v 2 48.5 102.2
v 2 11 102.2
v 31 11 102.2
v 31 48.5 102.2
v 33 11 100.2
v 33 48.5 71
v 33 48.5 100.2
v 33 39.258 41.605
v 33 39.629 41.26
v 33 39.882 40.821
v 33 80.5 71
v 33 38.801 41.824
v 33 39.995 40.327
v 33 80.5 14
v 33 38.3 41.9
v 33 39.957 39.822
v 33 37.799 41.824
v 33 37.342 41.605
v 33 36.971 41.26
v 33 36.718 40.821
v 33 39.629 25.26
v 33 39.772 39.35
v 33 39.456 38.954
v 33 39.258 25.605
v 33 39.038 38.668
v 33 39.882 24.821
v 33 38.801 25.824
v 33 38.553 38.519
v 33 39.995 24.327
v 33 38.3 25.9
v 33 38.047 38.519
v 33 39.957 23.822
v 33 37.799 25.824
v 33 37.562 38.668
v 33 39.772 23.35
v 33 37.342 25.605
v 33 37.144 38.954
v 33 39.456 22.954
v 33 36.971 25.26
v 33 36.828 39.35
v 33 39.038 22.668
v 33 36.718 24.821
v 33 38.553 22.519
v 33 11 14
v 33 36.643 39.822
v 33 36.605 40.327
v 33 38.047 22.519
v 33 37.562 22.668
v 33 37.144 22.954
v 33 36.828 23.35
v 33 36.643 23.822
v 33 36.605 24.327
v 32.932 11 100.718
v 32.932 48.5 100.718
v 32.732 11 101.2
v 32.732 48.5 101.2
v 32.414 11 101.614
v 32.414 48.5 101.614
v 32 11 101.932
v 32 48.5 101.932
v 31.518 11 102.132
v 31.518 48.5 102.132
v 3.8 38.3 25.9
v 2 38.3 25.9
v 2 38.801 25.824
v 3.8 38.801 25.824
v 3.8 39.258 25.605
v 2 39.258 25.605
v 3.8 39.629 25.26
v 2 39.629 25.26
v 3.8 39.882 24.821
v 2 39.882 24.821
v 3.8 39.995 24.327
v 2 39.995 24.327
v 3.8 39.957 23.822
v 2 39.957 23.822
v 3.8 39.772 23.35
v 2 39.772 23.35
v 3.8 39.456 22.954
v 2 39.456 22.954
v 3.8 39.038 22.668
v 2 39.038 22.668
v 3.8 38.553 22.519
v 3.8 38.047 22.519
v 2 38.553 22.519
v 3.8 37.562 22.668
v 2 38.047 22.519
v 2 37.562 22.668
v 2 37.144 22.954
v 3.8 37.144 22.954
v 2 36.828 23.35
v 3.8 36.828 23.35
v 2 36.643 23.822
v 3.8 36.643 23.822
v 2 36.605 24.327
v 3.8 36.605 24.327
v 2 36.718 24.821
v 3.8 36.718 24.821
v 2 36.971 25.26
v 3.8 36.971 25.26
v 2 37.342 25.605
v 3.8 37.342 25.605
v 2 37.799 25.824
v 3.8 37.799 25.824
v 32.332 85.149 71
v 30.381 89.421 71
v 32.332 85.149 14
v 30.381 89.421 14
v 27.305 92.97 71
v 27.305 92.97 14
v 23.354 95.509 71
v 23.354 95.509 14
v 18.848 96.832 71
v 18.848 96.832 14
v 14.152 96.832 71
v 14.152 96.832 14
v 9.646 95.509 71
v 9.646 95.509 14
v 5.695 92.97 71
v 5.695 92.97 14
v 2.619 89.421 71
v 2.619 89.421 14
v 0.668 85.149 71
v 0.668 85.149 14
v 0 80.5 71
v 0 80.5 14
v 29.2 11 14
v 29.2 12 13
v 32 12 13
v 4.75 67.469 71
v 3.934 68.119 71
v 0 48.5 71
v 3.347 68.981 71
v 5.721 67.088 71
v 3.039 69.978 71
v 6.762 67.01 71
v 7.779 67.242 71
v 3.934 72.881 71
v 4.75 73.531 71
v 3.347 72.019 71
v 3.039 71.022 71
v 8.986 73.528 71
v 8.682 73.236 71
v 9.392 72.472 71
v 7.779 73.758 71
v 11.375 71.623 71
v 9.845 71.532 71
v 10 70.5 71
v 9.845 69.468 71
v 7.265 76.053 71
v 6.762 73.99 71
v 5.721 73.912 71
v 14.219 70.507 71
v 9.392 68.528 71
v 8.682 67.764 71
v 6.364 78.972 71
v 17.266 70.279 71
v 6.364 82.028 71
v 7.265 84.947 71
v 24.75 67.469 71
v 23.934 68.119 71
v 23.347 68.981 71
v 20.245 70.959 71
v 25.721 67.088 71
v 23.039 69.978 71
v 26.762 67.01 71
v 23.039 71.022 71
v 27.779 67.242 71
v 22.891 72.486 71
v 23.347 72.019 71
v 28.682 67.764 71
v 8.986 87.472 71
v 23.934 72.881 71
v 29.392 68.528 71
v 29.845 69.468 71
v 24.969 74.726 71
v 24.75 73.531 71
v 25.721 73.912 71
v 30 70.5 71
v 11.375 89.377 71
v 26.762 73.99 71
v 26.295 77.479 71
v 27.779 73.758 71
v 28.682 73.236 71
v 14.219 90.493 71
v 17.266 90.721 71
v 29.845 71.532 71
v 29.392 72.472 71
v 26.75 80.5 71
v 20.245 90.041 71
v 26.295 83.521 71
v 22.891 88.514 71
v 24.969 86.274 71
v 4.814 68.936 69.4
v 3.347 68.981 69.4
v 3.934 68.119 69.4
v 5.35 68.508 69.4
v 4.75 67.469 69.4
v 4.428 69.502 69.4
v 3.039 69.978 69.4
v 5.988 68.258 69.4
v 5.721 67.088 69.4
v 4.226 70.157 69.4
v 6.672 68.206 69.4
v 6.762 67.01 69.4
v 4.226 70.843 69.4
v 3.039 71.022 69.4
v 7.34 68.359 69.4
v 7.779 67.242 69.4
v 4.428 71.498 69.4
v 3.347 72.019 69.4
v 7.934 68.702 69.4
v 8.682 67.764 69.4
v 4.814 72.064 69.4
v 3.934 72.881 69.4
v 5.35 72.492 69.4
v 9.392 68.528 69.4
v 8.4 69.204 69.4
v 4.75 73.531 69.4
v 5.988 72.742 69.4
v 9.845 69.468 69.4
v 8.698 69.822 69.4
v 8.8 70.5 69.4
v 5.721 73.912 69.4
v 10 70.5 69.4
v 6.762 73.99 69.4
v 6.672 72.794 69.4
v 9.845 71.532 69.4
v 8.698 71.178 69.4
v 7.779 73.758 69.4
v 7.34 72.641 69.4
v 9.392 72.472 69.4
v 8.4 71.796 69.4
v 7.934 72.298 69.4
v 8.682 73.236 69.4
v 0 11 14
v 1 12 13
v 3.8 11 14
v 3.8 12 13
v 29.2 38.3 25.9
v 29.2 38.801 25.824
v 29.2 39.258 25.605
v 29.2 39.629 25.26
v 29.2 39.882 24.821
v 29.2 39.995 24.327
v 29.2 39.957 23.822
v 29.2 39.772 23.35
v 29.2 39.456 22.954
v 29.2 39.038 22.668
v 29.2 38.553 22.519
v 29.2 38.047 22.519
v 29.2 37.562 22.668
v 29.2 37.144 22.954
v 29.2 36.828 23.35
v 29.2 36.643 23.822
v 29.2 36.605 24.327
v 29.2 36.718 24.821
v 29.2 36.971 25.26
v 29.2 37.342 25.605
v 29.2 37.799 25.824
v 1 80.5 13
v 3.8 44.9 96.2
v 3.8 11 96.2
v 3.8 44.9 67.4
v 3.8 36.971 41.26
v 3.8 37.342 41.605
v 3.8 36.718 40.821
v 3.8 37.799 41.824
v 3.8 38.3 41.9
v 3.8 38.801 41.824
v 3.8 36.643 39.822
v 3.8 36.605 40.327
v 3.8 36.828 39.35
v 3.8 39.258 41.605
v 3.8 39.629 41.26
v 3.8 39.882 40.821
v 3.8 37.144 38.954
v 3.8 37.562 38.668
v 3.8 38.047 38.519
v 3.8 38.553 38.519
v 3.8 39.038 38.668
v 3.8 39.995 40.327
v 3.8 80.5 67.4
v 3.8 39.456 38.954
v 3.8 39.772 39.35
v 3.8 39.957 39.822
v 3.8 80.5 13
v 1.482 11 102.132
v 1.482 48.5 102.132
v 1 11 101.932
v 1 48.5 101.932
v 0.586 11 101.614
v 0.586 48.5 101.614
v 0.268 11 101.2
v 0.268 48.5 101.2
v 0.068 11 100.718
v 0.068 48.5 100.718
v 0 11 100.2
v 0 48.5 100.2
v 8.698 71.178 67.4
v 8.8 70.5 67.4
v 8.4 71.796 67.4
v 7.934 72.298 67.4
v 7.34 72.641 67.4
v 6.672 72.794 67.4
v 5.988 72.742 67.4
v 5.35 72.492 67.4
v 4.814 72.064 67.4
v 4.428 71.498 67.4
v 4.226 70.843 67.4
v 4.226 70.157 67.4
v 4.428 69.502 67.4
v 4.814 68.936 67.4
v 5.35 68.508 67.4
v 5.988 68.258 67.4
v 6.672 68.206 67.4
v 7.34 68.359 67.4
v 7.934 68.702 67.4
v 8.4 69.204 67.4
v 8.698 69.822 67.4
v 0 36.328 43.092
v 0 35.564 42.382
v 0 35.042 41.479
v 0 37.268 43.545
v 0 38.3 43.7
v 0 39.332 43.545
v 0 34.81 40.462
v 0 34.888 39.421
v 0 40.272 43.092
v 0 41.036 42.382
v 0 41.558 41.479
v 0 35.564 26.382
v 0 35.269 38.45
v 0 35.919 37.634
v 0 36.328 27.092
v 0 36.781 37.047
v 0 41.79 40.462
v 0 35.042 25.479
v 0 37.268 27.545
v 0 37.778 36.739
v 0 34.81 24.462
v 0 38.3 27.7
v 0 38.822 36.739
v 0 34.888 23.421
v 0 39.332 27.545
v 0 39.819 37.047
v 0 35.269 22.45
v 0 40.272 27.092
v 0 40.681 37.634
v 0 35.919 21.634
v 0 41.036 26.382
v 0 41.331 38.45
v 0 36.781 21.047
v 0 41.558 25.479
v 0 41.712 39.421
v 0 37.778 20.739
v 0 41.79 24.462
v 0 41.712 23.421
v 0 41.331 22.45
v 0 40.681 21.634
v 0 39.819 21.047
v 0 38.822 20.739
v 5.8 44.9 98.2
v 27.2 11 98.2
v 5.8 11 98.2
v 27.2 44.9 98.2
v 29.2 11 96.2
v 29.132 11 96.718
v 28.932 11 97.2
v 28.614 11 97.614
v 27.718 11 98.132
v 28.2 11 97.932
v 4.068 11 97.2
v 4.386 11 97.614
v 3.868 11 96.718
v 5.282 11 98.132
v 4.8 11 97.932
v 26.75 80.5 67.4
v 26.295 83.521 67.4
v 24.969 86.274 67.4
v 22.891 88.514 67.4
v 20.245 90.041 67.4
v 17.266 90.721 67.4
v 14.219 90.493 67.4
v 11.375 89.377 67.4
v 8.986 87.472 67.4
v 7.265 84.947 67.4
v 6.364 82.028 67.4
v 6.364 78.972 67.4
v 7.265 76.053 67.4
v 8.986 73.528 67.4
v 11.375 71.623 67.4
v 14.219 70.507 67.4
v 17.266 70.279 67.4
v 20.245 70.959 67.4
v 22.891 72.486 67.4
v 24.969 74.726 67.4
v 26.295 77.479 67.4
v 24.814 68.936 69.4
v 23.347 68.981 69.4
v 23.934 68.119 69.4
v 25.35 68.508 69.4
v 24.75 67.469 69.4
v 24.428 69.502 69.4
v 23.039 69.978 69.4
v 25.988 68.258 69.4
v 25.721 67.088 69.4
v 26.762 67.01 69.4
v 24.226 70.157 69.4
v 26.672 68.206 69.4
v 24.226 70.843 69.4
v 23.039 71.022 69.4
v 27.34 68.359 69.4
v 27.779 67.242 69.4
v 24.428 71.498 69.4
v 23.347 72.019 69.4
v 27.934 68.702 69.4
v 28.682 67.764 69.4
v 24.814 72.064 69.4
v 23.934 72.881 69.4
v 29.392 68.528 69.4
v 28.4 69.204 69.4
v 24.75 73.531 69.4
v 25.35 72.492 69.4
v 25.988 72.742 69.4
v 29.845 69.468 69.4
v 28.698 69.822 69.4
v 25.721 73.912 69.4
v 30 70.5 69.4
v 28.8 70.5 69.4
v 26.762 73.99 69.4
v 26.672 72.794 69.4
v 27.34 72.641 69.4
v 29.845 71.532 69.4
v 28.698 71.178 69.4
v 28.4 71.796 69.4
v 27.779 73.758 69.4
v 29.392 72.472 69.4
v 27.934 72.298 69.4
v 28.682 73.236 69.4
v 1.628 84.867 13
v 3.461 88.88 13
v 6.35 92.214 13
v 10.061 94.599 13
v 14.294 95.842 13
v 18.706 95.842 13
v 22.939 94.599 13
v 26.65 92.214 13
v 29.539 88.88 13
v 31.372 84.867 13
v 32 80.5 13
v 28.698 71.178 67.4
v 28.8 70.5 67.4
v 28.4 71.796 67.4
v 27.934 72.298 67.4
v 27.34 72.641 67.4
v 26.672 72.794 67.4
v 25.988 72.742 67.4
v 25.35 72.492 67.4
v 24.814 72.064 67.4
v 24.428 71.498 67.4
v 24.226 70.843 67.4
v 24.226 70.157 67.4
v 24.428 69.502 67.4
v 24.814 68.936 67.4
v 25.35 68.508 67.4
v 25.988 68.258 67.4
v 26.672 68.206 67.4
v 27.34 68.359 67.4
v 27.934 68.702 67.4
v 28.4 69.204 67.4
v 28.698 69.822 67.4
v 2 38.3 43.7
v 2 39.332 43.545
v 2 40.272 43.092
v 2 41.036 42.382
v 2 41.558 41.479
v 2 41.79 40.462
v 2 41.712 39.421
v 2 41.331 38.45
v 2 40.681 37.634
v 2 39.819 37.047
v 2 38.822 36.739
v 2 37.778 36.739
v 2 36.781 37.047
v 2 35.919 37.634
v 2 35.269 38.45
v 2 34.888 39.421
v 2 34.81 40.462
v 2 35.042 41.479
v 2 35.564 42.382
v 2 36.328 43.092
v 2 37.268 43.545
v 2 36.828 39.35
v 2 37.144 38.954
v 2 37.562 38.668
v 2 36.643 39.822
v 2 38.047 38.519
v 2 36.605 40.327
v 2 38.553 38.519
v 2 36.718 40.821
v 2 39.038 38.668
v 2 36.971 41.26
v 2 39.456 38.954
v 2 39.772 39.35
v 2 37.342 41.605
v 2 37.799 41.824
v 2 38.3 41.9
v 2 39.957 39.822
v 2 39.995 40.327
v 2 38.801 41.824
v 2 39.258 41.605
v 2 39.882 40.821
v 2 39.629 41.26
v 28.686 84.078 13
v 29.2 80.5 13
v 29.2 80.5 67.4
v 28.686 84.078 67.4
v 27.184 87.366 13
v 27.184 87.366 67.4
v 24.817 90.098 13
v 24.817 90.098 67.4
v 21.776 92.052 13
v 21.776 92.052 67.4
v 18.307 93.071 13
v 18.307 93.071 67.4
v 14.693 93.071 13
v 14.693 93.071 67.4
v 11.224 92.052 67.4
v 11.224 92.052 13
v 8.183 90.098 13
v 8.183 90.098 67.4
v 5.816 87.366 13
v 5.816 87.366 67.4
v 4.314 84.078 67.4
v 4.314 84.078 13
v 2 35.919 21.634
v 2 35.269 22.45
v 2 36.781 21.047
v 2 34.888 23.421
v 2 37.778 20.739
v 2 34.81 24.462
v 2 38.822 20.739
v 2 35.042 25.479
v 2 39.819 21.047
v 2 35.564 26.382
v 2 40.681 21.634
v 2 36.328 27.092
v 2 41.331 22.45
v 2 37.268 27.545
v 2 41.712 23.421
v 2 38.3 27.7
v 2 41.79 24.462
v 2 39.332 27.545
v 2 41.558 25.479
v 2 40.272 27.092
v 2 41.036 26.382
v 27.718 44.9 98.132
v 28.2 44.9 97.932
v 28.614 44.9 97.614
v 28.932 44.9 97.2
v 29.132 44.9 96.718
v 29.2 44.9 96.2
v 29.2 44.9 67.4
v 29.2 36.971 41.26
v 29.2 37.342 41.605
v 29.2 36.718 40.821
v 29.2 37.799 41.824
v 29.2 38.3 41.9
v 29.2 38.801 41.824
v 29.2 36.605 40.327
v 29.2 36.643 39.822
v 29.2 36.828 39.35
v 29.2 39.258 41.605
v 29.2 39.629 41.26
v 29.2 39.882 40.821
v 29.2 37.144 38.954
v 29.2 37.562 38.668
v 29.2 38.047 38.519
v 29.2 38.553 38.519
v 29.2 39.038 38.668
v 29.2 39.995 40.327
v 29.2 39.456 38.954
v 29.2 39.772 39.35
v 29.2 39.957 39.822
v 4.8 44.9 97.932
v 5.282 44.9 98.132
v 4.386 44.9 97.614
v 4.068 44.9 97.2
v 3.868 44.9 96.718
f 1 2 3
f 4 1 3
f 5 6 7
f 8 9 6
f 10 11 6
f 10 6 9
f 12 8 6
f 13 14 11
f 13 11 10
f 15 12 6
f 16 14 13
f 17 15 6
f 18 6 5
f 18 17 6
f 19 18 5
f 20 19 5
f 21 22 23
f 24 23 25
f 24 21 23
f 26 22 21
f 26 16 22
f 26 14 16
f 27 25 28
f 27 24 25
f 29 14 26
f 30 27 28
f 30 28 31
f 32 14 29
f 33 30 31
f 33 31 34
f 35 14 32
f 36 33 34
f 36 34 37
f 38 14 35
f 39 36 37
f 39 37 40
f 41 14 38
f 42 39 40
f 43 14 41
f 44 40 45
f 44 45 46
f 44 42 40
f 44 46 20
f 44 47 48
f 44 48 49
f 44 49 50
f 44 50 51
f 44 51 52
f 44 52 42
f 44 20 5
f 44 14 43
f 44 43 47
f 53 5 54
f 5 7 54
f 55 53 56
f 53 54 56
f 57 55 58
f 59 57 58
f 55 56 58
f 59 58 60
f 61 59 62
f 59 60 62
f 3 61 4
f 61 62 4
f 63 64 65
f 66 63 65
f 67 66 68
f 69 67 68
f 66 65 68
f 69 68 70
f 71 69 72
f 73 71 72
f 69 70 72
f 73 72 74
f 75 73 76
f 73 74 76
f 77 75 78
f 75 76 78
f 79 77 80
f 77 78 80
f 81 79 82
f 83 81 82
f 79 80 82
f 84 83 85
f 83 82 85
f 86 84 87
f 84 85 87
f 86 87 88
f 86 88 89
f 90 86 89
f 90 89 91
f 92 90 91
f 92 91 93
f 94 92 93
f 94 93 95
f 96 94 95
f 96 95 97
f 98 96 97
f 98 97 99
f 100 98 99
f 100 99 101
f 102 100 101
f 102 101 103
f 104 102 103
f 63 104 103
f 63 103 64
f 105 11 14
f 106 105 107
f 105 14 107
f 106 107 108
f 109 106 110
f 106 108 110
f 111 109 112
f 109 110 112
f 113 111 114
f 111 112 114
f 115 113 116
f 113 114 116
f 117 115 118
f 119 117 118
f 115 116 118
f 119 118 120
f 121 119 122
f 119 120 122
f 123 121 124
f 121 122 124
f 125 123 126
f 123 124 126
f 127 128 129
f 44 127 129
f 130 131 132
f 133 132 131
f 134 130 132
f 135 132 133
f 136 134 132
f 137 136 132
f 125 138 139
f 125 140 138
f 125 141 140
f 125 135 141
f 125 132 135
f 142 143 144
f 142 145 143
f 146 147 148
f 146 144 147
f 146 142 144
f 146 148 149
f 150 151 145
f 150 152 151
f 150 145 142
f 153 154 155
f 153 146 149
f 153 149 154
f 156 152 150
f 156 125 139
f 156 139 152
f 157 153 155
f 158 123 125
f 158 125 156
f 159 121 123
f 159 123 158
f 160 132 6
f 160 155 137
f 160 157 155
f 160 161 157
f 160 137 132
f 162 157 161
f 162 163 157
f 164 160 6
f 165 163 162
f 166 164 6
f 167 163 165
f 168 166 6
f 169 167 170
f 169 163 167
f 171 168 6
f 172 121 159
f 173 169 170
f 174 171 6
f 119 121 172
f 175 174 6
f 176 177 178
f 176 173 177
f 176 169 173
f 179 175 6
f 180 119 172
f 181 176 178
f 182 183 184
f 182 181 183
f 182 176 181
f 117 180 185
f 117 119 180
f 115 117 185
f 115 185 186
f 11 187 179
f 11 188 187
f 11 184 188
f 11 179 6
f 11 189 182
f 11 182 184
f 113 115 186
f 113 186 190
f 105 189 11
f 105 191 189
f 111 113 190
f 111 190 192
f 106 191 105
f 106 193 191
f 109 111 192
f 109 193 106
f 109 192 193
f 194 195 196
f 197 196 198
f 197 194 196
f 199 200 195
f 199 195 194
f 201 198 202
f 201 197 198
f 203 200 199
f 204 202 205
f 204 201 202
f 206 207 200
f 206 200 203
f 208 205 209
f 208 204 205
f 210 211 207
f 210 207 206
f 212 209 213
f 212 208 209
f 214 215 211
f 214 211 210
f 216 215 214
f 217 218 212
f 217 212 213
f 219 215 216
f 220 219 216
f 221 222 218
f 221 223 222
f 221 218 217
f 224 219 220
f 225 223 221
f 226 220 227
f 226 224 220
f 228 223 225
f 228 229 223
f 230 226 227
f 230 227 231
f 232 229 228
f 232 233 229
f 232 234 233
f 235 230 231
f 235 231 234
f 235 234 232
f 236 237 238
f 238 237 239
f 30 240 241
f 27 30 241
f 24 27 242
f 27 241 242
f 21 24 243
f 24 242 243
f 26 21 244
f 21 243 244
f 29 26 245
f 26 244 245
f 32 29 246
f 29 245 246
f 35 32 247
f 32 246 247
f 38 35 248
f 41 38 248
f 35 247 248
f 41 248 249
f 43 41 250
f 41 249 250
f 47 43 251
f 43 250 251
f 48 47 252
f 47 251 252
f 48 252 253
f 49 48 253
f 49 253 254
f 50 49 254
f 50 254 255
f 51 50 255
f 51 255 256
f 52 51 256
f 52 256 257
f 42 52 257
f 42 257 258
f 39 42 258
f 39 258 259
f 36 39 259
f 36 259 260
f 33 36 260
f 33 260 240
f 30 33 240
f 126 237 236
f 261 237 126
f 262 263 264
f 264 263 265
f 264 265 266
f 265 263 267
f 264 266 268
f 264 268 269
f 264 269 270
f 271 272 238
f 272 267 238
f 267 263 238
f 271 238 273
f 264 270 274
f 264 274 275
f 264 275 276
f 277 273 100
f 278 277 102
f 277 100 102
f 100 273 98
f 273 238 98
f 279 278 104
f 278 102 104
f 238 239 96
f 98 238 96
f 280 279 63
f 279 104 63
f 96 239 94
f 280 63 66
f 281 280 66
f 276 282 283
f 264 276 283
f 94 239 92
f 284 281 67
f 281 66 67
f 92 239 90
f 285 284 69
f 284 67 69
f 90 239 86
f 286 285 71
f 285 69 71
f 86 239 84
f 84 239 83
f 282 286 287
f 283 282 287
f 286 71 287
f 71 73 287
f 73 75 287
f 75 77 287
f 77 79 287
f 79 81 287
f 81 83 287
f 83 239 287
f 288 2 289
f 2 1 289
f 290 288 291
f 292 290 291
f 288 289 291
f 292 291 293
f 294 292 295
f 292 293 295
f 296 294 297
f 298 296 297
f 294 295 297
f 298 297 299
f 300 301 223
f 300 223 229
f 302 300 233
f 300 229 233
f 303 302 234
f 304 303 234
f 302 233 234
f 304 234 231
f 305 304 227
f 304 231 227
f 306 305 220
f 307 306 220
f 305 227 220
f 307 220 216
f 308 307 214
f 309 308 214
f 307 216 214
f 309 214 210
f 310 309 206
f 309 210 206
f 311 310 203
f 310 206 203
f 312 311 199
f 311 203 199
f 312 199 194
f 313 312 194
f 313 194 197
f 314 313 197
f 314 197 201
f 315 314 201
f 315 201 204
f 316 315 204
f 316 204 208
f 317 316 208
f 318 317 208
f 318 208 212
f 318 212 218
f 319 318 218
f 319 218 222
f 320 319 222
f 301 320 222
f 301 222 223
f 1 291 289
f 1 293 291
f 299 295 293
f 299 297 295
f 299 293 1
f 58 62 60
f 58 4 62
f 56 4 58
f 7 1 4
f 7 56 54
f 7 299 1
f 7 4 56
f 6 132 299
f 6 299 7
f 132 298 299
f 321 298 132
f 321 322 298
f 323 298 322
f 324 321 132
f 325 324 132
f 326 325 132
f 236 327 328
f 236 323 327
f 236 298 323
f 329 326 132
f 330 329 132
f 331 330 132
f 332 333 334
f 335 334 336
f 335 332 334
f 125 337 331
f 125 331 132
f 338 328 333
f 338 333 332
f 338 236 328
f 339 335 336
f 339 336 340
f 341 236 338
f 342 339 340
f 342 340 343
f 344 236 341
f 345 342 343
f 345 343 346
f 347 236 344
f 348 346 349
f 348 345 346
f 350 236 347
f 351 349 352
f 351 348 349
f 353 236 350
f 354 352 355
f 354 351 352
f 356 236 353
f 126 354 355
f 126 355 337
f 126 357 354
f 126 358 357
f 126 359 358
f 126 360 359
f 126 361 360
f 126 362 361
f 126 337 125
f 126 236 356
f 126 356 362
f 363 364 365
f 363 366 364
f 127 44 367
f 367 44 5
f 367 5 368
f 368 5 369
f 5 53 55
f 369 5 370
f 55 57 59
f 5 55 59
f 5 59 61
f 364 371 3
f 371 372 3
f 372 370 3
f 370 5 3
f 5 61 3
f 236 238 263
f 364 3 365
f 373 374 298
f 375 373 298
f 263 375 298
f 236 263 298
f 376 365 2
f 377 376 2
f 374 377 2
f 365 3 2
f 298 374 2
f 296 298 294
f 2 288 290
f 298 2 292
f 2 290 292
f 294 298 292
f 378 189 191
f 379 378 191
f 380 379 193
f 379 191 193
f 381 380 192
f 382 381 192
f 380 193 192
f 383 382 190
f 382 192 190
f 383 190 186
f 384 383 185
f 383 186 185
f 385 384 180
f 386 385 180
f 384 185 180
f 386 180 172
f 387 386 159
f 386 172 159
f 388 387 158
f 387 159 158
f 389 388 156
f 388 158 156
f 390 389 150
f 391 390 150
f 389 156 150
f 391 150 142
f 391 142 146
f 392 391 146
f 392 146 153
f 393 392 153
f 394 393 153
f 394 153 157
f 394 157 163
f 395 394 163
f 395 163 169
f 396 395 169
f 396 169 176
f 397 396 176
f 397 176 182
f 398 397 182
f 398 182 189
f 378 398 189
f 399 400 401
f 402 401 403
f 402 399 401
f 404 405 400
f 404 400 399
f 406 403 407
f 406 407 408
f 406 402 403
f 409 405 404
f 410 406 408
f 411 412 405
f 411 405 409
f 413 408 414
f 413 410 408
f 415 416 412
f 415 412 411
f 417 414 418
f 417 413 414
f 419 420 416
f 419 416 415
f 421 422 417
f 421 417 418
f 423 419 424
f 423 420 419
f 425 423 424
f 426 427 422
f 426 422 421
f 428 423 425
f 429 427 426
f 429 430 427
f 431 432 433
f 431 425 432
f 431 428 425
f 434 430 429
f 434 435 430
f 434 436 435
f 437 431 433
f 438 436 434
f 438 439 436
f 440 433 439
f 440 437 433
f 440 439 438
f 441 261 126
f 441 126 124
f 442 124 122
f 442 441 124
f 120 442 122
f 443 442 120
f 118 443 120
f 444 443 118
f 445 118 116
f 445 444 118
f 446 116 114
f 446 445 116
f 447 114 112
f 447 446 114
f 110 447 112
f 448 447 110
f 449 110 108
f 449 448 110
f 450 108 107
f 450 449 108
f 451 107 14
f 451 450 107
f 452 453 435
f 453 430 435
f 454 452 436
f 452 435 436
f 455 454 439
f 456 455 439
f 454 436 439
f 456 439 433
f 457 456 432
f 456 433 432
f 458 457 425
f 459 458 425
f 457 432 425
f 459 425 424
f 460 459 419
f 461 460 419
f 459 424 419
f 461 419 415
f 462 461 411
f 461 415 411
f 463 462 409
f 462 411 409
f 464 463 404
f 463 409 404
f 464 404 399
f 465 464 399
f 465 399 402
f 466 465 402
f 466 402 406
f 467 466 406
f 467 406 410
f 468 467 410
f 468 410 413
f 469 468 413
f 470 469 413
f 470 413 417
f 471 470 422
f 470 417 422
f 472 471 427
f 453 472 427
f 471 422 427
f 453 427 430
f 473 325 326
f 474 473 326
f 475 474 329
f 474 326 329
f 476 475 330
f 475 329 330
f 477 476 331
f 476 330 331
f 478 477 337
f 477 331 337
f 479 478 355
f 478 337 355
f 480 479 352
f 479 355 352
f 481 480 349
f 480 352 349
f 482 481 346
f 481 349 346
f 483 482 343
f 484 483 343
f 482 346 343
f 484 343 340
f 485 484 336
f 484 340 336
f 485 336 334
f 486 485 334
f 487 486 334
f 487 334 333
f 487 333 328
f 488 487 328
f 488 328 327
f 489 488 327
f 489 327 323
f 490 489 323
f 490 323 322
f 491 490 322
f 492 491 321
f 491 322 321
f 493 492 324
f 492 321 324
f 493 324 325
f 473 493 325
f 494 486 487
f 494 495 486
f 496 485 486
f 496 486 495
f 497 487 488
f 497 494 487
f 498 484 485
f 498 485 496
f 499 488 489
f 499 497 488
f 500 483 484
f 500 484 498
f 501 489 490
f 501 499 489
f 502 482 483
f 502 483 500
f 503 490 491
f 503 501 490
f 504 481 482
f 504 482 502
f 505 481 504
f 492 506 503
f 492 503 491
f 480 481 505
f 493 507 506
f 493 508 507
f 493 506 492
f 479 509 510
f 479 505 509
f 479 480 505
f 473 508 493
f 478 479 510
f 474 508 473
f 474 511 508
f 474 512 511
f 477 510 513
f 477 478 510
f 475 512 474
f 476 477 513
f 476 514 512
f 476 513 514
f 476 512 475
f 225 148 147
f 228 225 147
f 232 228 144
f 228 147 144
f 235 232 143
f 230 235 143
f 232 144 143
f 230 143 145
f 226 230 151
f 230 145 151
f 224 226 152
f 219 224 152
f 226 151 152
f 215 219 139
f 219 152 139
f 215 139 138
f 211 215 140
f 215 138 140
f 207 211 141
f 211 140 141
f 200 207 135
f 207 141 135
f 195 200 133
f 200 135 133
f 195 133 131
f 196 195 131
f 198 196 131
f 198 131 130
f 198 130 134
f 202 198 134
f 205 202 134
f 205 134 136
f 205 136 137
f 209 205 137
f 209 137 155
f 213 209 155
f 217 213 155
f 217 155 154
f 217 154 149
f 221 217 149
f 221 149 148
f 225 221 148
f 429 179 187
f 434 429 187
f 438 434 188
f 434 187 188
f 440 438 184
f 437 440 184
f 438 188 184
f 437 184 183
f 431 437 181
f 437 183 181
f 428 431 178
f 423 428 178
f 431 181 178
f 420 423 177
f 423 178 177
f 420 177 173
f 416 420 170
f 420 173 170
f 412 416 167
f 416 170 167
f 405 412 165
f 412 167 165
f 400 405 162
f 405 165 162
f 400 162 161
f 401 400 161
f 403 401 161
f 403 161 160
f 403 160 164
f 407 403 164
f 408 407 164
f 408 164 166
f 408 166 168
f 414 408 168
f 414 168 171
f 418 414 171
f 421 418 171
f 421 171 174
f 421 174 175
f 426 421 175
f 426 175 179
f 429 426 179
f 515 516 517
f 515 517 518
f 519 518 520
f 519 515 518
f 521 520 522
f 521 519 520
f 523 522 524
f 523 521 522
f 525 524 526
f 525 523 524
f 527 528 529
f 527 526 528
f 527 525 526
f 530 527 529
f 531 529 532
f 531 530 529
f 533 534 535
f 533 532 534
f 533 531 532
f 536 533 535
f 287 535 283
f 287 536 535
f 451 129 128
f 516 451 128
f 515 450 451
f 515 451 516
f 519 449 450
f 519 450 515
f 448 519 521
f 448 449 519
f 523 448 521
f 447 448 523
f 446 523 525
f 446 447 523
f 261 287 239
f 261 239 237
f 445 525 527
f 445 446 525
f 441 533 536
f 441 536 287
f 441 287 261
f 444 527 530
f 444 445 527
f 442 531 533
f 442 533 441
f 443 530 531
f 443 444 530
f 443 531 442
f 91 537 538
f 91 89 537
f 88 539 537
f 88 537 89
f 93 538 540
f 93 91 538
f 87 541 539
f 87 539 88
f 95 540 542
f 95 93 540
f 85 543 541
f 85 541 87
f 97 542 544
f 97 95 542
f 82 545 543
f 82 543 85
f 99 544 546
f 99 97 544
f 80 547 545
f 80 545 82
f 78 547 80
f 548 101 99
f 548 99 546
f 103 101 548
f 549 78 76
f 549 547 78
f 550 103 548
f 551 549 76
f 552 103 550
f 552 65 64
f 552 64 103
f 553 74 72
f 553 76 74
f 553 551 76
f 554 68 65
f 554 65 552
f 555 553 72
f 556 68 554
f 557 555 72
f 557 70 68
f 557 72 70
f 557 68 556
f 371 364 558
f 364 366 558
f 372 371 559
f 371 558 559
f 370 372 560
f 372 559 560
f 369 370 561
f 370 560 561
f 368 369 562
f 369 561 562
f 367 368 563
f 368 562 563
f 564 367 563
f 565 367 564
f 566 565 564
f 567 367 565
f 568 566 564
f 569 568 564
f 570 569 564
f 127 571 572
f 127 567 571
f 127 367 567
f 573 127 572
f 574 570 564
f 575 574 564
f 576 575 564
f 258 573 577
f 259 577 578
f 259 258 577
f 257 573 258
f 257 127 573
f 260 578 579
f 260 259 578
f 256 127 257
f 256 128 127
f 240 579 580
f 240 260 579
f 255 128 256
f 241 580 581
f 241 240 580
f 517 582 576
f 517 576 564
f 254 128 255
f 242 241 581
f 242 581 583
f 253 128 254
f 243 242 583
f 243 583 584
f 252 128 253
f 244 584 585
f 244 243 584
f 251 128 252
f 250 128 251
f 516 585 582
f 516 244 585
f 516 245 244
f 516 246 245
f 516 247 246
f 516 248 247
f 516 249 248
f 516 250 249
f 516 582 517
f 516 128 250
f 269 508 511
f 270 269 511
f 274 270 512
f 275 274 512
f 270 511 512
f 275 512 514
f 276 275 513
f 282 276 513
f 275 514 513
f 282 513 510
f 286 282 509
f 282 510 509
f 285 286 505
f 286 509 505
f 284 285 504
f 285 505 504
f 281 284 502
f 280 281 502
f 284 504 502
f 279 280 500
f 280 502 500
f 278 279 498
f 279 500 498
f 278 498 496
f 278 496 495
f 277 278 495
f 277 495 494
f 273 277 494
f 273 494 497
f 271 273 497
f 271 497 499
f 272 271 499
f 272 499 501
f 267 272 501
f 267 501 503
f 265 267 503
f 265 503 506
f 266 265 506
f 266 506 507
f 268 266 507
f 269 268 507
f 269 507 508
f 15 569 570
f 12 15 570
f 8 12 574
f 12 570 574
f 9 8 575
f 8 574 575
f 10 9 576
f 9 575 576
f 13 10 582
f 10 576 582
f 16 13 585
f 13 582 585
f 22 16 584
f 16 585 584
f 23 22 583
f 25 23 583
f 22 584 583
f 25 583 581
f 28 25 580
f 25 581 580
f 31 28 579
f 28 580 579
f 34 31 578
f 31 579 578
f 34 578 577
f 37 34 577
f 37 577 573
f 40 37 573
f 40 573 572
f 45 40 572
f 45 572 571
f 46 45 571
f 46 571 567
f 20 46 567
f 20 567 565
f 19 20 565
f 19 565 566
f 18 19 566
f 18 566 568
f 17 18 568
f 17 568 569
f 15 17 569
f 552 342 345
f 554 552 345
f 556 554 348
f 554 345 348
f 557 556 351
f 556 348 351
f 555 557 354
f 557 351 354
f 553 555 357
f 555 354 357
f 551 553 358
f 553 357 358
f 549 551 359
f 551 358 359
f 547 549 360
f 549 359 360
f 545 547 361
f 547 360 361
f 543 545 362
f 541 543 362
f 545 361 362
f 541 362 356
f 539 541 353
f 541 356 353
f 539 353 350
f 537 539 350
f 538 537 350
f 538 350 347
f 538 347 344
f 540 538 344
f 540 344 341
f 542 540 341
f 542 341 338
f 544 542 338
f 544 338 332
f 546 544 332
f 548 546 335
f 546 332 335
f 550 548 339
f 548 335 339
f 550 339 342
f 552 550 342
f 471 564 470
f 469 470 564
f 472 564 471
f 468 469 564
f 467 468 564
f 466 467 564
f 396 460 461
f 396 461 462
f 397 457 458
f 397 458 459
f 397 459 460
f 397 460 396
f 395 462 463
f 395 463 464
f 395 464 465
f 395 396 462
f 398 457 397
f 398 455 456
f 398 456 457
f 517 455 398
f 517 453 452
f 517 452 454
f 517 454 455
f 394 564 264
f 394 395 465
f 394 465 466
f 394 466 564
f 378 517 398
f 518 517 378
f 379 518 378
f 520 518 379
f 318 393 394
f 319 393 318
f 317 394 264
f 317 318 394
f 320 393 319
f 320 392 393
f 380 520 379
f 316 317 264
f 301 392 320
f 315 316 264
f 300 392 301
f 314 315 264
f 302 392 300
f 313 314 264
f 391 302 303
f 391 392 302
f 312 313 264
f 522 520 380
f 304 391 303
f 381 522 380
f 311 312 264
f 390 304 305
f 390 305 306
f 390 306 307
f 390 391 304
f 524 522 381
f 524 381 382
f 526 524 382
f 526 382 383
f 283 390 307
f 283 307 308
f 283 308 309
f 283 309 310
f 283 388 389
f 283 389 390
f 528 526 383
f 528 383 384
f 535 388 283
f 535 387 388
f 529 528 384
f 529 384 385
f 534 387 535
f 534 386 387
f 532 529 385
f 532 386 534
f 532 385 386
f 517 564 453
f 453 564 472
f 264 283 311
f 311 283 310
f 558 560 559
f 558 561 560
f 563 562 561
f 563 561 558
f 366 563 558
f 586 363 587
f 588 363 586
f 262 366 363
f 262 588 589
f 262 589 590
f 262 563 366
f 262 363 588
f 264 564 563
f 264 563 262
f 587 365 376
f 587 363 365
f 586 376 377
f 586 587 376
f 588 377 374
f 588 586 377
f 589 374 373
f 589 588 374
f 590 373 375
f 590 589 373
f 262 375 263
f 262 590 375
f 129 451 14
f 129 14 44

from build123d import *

# Parameters (mm, degrees)
SKETCH1_W                                      = 4
SKETCH1_H                                      = 80.5
BOSS_EXTRUDE1_DEPTH                            = 71
BOSS_EXTRUDE2_START                            = -4
BOSS_EXTRUDE2_DEPTH                            = 4
BOSS_EXTRUDE3_DEPTH                            = 34.2
CUT_EXTRUDE1_DEPTH                             = 13
CUT_EXTRUDE2_DEPTH                             = 13
SKETCH6_R                                      = 1.7
CUT_EXTRUDE3_DEPTH                             = 13
SKETCH7_R                                      = 3.25
CUT_EXTRUDE4_DEPTH                             = 2.5
BOSS_EXTRUDE4_DEPTH                            = 44.5
SKETCH10_W                                     = 46.002383675
SKETCH10_H                                     = 61.711229379
CUT_EXTRUDE5_DEPTH                             = 42
BOSS_EXTRUDE5_DEPTH                            = 4
CUT_EXTRUDE6_DEPTH                             = 10.6
CUT_EXTRUDE7_REACH                             = 148.85
SKETCH13_R                                     = 1.7
SKETCH14_W                                     = 25
SKETCH14_H                                     = 33.9
BOSS_EXTRUDE6_DEPTH                            = 1
CUT_EXTRUDE8_DEPTH                             = 15
SKETCH16_W                                     = 10.4
SKETCH16_H                                     = 1.3
CUT_EXTRUDE9_DEPTH                             = 15
POPUNIO_RUPU_DEPTH                             = 15
SKETCH18_W                                     = 33
SKETCH18_H                                     = 37.9
SASEKAO_ZA_TRI_MM_DEPTH                        = 3
SKETCH19_R                                     = 3.5
SKETCH19_R_2                                   = 3.25
POVE_AO_RUPE_ZA_ZAVRTNJE_DEPTH                 = 2.5
SKRATIO_DNO_DEPTH                              = 0.4
SKETCH21_W                                     = 25
SKETCH21_H                                     = 33.2
NAPRAVIO_MALO_VI_E_MESTA_ZA_VRH_RAZVODNI_DEPTH = 0.4
SKRATIO_CEONI_DEO_DEPTH                        = 0.4
NAPRAVIO_MESTA_ZA_DRZAC_1_REACH                = 137.848
SKETCH24_W                                     = 0.2
SKETCH24_H                                     = 33.9
NAPRAVIO_EMSTA_ZA_DRZAC_2_DEPTH                = 32.8
CHAMFER1_SIZE                                  = 1
SKETCH26_R                                     = 2.3
POVECAO_OTVOR_ZA_M3_DEPTH                      = 1.1
SKETCH27_R                                     = 10.25
POVECAO_OTVOR_ZA_PRIKLJUCAK_DEPTH              = 10
SKETCH28_W                                     = 25.4
SKETCH28_H                                     = 33.9
BOSS_EXTRUDE7_DEPTH                            = 2
ZAOBLJENJE_ZA_PRST_R                           = 2
OBORENA_IVICA_ZA_AKU_SIZE                      = 1
BOSS_EXTRUDE8_START                            = 0.9
SKETCH29_R                                     = 3.5
SKETCH29_R_2                                   = 2.3
BOSS_EXTRUDE8_DEPTH                            = 0.9
SKETCH30_R                                     = 3.5
CUT_EXTRUDE10_DEPTH                            = 2


with BuildPart() as part:
    # Sketch1 → Boss-Extrude1 (new body)
    with BuildSketch(Plane.XY):
        with Locations((2, 40.25)):
            Rectangle(SKETCH1_W, SKETCH1_H)
        with BuildLine():
            Line((0, 80.5), (4, 80.5))
            ThreePointArc((4, 80.5), (16.5, 93), (29, 80.5))
            Line((29, 80.5), (33, 80.5))
            ThreePointArc((33, 80.5), (16.5, 97), (0, 80.5))
        make_face()
        with Locations((31, 40.25)):
            Rectangle(SKETCH1_W, SKETCH1_H)
    extrude(amount=BOSS_EXTRUDE1_DEPTH)

    # Sketch2 → Boss-Extrude2 (add)
    with BuildSketch(Plane.XY.offset(71).offset(BOSS_EXTRUDE2_START)):
        with BuildLine():
            Line((33, 48.5), (0, 48.5))
            Line((0, 48.5), (0, 80.5))
            ThreePointArc((0, 80.5), (16.5, 97), (33, 80.5))
            Line((33, 80.5), (33, 48.5))
        make_face()
    extrude(amount=BOSS_EXTRUDE2_DEPTH)

    # Sketch3 → Boss-Extrude3 (add)
    with BuildSketch(Plane(origin=(0, 0, 67), x_dir=(-1, 0, 0), z_dir=(0, 0, -1))):
        Polygon((-33, 0), (-33, 48.5), (-29, 48.5), (-4, 48.5), (0, 48.5), (0, 0), (-3.837905566, 0), (-4, 44.5), (-29, 44.5), (-29.162094434, 0), align=None)
    extrude(amount=-BOSS_EXTRUDE3_DEPTH)

    # Sketch4 → Cut-Extrude1 (cut)
    with BuildSketch(Plane(origin=(0, 0, 0), x_dir=(-1, 0, 0), z_dir=(0, 0, -1))):
        with BuildLine():
            Line((-4, 80.5), (-4, 0))
            Line((-4, 0), (0, 0))
            Line((0, 0), (0, 80.5))
            ThreePointArc((0, 80.5), (-16.5, 97), (-33, 80.5))
            Line((-33, 80.5), (-33, 0))
            Line((-33, 0), (-29, 0))
            Line((-29, 0), (-29, 80.5))
            ThreePointArc((-29, 80.5), (-16.5, 93), (-4, 80.5))
        make_face()
    extrude(amount=-CUT_EXTRUDE1_DEPTH, mode=Mode.SUBTRACT)

    # Sketch5 → Cut-Extrude2 (cut)
    with BuildSketch(Plane.XY.offset(71)):
        with BuildLine():
            ThreePointArc((26.5, 80.5), (16.5, 90.5), (6.5, 80.5))
            Line((6.5, 80.5), (26.5, 80.5))
        make_face()
        with BuildLine():
            Line((26.5, 80.5), (6.5, 80.5))
            ThreePointArc((6.5, 80.5), (16.5, 70.5), (26.5, 80.5))
        make_face()
    extrude(amount=-CUT_EXTRUDE2_DEPTH, mode=Mode.SUBTRACT)

    # Sketch6 → Cut-Extrude3 (cut)
    with BuildSketch(Plane.XY.offset(71)):
        with Locations((6.5, 70.5)):
            Circle(SKETCH6_R)
        with BuildLine():
            ThreePointArc((28.2, 70.5), (26.5, 72.2), (24.8, 70.5))
            Line((24.8, 70.5), (28.2, 70.5))
        make_face()
        with BuildLine():
            Line((28.2, 70.5), (24.8, 70.5))
            ThreePointArc((24.8, 70.5), (26.5, 68.8), (28.2, 70.5))
        make_face()
    extrude(amount=-CUT_EXTRUDE3_DEPTH, mode=Mode.SUBTRACT)

    # Sketch7 → Cut-Extrude4 (cut)
    with BuildSketch(Plane.XY.offset(71)):
        with Locations((6.5, 70.5)):
            Circle(SKETCH7_R)
        with Locations((26.5, 70.5)):
            Circle(SKETCH7_R)
    extrude(amount=-CUT_EXTRUDE4_DEPTH, mode=Mode.SUBTRACT)

    # Sketch9 → Boss-Extrude4 (add)
    with BuildSketch(Plane.XZ):
        Polygon((29.162094434, 101.2), (29.162094434, 71), (29, 71), (29, 120), align=None)
        Polygon((4, 120), (3.837905566, 101.2), (3.837905566, 71), (4, 71), align=None)
    extrude(amount=-BOSS_EXTRUDE4_DEPTH)

    # Sketch10 → Cut-Extrude5 (cut)
    with BuildSketch(Plane.XY.offset(101.2)):
        with Locations((17.24268837, 24.291112106)):
            Rectangle(SKETCH10_W, SKETCH10_H)
    extrude(amount=CUT_EXTRUDE5_DEPTH, mode=Mode.SUBTRACT)

    # Sketch11 → Boss-Extrude5 (add)
    with BuildSketch(Plane.XY.offset(101.2)):
        Polygon((29, 0), (4, 0), (0, 0), (0, 48.5), (33, 48.5), (33, 0), align=None)
    extrude(amount=BOSS_EXTRUDE5_DEPTH)

    # Sketch12 → Cut-Extrude6 (cut)
    with BuildSketch(Plane.XZ):
        Polygon((4, 13), (4, 101.2), (29, 101.2), (29, 13), (33, 13), (33, 105.2), (0, 105.2), (0, 13), align=None)
    extrude(amount=-CUT_EXTRUDE6_DEPTH, mode=Mode.SUBTRACT)

    # Cut-Extrude7: up to this face of the body (flat: up to its plane)
    cut_extrude7_end = Plane(part.part.faces().sort_by_distance((33, 41.673849147, 53.168159645))[0])
    # Sketch13 → Cut-Extrude7 (cut, up to the picked face)
    with BuildSketch(Plane.ZY, mode=Mode.PRIVATE) as cut_extrude7_sk1:
        with Locations((40.2, 38.3)):
            Circle(SKETCH13_R)
    cut_extrude7_tool1 = split(extrude(cut_extrude7_sk1.sketch, amount=-CUT_EXTRUDE7_REACH, mode=Mode.PRIVATE), bisect_by=cut_extrude7_end, keep=Keep.BOTH, mode=Mode.PRIVATE)
    # Sketch13 → Cut-Extrude7 (cut, up to the picked face)
    with BuildSketch(Plane.ZY, mode=Mode.PRIVATE) as cut_extrude7_sk2:
        with Locations((24.2, 38.3)):
            Circle(SKETCH13_R)
    cut_extrude7_tool2 = split(extrude(cut_extrude7_sk2.sketch, amount=-CUT_EXTRUDE7_REACH, mode=Mode.PRIVATE), bisect_by=cut_extrude7_end, keep=Keep.BOTH, mode=Mode.PRIVATE)
    add(cut_extrude7_tool1.solids().sort_by(Axis((0, 38.3, 40.2), (1, 0, 0)))[0], mode=Mode.SUBTRACT)
    add(cut_extrude7_tool2.solids().sort_by(Axis((0, 38.3, 24.2), (1, 0, 0)))[0], mode=Mode.SUBTRACT)

    # Sketch14 → Boss-Extrude6 (add)
    with BuildSketch(Plane(origin=(0, 0, 101.2), x_dir=(-1, 0, 0), z_dir=(0, 0, -1))):
        with Locations((-16.5, 27.55)):
            Rectangle(SKETCH14_W, SKETCH14_H)
    extrude(amount=BOSS_EXTRUDE6_DEPTH)

    # Sketch15 → Cut-Extrude8 (cut)
    with BuildSketch(Plane.XZ.offset(-10.6)):
        Polygon((26.7, 103.9), (6.3, 103.9), (6.3, 101.5), (16.5, 101.5), (26.7, 101.5), align=None)
    extrude(amount=-CUT_EXTRUDE8_DEPTH, mode=Mode.SUBTRACT)

    # Sketch16 → Cut-Extrude9 (cut)
    with BuildSketch(Plane.XZ.offset(-10.6)):
        with Locations((16.5, 104.55)):
            Rectangle(SKETCH16_W, SKETCH16_H)
    extrude(amount=-CUT_EXTRUDE9_DEPTH, mode=Mode.SUBTRACT)

    # Sketch17 → popunio rupu (add)
    with BuildSketch(Plane.XZ.offset(-25.6)):
        Polygon((26.7, 103.9), (21.7, 103.9), (21.7, 105.2), (11.3, 105.2), (11.3, 103.9), (6.3, 103.9), (6.3, 101.5), (26.7, 101.5), align=None)
    extrude(amount=POPUNIO_RUPU_DEPTH)

    # Sketch18 → sasekao za tri mm (cut)
    with BuildSketch(Plane.XY.offset(105.2)):
        with Locations((16.5, 29.55)):
            Rectangle(SKETCH18_W, SKETCH18_H)
    extrude(amount=-SASEKAO_ZA_TRI_MM_DEPTH, mode=Mode.SUBTRACT)

    # Sketch19 → pove'ao rupe za zavrtnje (cut)
    # profile 1 of 2: a face of its own
    with BuildSketch(Plane.XY.offset(71)):
        with Locations((6.5, 70.5)):
            Circle(SKETCH19_R)
        with Locations((6.5, 70.5)):
            Circle(SKETCH19_R_2, mode=Mode.SUBTRACT)
    # profile 2 of 2: a face of its own
    with BuildSketch(Plane.XY.offset(71)):
        with Locations((26.5, 70.5)):
            Circle(SKETCH19_R)
    extrude(amount=-POVE_AO_RUPE_ZA_ZAVRTNJE_DEPTH, mode=Mode.SUBTRACT)

    # Sketch20 → skratio dno (cut)
    with BuildSketch(Plane.XZ.offset(-10.6)):
        Polygon((33, 13), (33, 102.2), (0, 102.2), (0, 13), (4, 13), (4, 100.2), (29, 100.2), (29, 13), align=None)
    extrude(amount=-SKRATIO_DNO_DEPTH, mode=Mode.SUBTRACT)

    # Sketch21 → napravio malo vi[e mesta za vrh razvodnika (cut)
    with BuildSketch(Plane.XZ.offset(-44.5)):
        with Locations((16.5, 83.6)):
            Rectangle(SKETCH21_W, SKETCH21_H)
    extrude(amount=-NAPRAVIO_MALO_VI_E_MESTA_ZA_VRH_RAZVODNI_DEPTH, mode=Mode.SUBTRACT)

    # Sketch22 → skratio ceoni deo (cut)
    with BuildSketch(Plane(origin=(0, 0, 67), x_dir=(-1, 0, 0), z_dir=(0, 0, -1))):
        with BuildLine():
            Line((-29, 44.9), (-4, 44.9))
            Line((-4, 44.9), (-4, 80.5))
            ThreePointArc((-4, 80.5), (-16.5, 93), (-29, 80.5))
            Line((-29, 80.5), (-29, 44.9))
        make_face()
    extrude(amount=-SKRATIO_CEONI_DEO_DEPTH, mode=Mode.SUBTRACT)

    # napravio mesta za drzac 1: up to this face of the body (flat: up to its plane)
    napravio_mesta_za_drzac_1_end = Plane(part.part.faces().sort_by_distance((16.5, 62.621792599, 67.4))[0])
    # Sketch23 → napravio mesta za drzac 1 (cut, up to the picked face)
    with BuildSketch(Plane(origin=(0, 0, 13), x_dir=(-1, 0, 0), z_dir=(0, 0, -1)), mode=Mode.PRIVATE) as napravio_mesta_za_drzac_1_sk1:
        with BuildLine():
            Line((-29, 80.5), (-29, 11))
            Line((-29, 11), (-29.2, 11))
            Line((-29.2, 11), (-29.2, 80.5))
            ThreePointArc((-29.2, 80.5), (-16.5, 93.2), (-3.8, 80.5))
            Line((-3.8, 80.5), (-3.8, 11))
            Line((-3.8, 11), (-4, 11))
            Line((-4, 11), (-4, 80.5))
            ThreePointArc((-4, 80.5), (-16.5, 93), (-29, 80.5))
        make_face()
    napravio_mesta_za_drzac_1_tool1 = split(extrude(napravio_mesta_za_drzac_1_sk1.sketch, amount=-NAPRAVIO_MESTA_ZA_DRZAC_1_REACH, mode=Mode.PRIVATE), bisect_by=napravio_mesta_za_drzac_1_end, keep=Keep.BOTH, mode=Mode.PRIVATE)
    add(napravio_mesta_za_drzac_1_tool1.solids().sort_by(Axis((16.5, 93.113965, 13), (0, 0, 1)))[0], mode=Mode.SUBTRACT)

    # Sketch24 → napravio emsta za drzac 2 (cut)
    with BuildSketch(Plane(origin=(0, 0, 67.4), x_dir=(-1, 0, 0), z_dir=(0, 0, -1))):
        with Locations((-3.9, 27.95)):
            Rectangle(SKETCH24_W, SKETCH24_H)
        with Locations((-29.1, 27.95)):
            Rectangle(SKETCH24_W, SKETCH24_H)
    extrude(amount=-NAPRAVIO_EMSTA_ZA_DRZAC_2_DEPTH, mode=Mode.SUBTRACT)

    # Chamfer1
    chamfer1_edges = [part.edges().sort_by_distance(p)[0] for p in [
        (1.9, 11, 13),
        (31.1, 11, 13),
    ]]
    chamfer(chamfer1_edges, length=CHAMFER1_SIZE)

    # Sketch26 → povecao otvor za M3 (cut)
    with BuildSketch(Plane.XY.offset(68.5)):
        with Locations((26.5, 70.5)):
            Circle(SKETCH26_R)
        with Locations((6.5, 70.5)):
            Circle(SKETCH26_R)
    extrude(amount=-POVECAO_OTVOR_ZA_M3_DEPTH, mode=Mode.SUBTRACT)

    # Sketch27 → povecao otvor za prikljucak (cut)
    with BuildSketch(Plane.XY.offset(71)):
        with Locations((16.5, 80.5)):
            Circle(SKETCH27_R)
    extrude(amount=-POVECAO_OTVOR_ZA_PRIKLJUCAK_DEPTH, mode=Mode.SUBTRACT)

    # Sketch28 → Boss-Extrude7 (add)
    with BuildSketch(Plane(origin=(0, 0, 100.2), x_dir=(-1, 0, 0), z_dir=(0, 0, -1))):
        with Locations((-16.5, 27.95)):
            Rectangle(SKETCH28_W, SKETCH28_H)
    extrude(amount=BOSS_EXTRUDE7_DEPTH)

    # zaobljenje za prst
    zaobljenje_za_prst_edges = [part.edges().sort_by_distance(p)[0] for p in [
        (0, 29.75, 102.2),
        (33, 29.75, 102.2),
        (3.8, 27.95, 98.2),
        (29.2, 27.95, 98.2),
    ]]
    fillet(zaobljenje_za_prst_edges, radius=ZAOBLJENJE_ZA_PRST_R)

    # oborena ivica za šaku
    oborena_ivica_za_aku_edges = [part.edges().sort_by_distance(p)[0] for p in [
        (0, 46.25, 13),
        (16.5, 97, 13),
        (33, 46.25, 13),
    ]]
    chamfer(oborena_ivica_za_aku_edges, length=OBORENA_IVICA_ZA_AKU_SIZE)

    # Sketch29 → Boss-Extrude8 (add)
    # profile 1 of 2: a face of its own
    with BuildSketch(Plane.XY.offset(68.5).offset(BOSS_EXTRUDE8_START)):
        with Locations((6.5, 70.5)):
            Circle(SKETCH29_R)
        with Locations((6.5, 70.5)):
            Circle(SKETCH29_R_2, mode=Mode.SUBTRACT)
    # profile 2 of 2: a face of its own
    with BuildSketch(Plane.XY.offset(68.5).offset(BOSS_EXTRUDE8_START)):
        with Locations((26.5, 70.5)):
            Circle(SKETCH29_R)
        with Locations((26.5, 70.5)):
            Circle(SKETCH29_R_2, mode=Mode.SUBTRACT)
    extrude(amount=-BOSS_EXTRUDE8_DEPTH)

    # Sketch30 → Cut-Extrude10 (cut)
    with BuildSketch(Plane.ZY):
        with Locations((24.2, 38.3)):
            Circle(SKETCH30_R)
        with Locations((40.2, 38.3)):
            Circle(SKETCH30_R)
    extrude(amount=-CUT_EXTRUDE10_DEPTH, mode=Mode.SUBTRACT)


solid = part.part
